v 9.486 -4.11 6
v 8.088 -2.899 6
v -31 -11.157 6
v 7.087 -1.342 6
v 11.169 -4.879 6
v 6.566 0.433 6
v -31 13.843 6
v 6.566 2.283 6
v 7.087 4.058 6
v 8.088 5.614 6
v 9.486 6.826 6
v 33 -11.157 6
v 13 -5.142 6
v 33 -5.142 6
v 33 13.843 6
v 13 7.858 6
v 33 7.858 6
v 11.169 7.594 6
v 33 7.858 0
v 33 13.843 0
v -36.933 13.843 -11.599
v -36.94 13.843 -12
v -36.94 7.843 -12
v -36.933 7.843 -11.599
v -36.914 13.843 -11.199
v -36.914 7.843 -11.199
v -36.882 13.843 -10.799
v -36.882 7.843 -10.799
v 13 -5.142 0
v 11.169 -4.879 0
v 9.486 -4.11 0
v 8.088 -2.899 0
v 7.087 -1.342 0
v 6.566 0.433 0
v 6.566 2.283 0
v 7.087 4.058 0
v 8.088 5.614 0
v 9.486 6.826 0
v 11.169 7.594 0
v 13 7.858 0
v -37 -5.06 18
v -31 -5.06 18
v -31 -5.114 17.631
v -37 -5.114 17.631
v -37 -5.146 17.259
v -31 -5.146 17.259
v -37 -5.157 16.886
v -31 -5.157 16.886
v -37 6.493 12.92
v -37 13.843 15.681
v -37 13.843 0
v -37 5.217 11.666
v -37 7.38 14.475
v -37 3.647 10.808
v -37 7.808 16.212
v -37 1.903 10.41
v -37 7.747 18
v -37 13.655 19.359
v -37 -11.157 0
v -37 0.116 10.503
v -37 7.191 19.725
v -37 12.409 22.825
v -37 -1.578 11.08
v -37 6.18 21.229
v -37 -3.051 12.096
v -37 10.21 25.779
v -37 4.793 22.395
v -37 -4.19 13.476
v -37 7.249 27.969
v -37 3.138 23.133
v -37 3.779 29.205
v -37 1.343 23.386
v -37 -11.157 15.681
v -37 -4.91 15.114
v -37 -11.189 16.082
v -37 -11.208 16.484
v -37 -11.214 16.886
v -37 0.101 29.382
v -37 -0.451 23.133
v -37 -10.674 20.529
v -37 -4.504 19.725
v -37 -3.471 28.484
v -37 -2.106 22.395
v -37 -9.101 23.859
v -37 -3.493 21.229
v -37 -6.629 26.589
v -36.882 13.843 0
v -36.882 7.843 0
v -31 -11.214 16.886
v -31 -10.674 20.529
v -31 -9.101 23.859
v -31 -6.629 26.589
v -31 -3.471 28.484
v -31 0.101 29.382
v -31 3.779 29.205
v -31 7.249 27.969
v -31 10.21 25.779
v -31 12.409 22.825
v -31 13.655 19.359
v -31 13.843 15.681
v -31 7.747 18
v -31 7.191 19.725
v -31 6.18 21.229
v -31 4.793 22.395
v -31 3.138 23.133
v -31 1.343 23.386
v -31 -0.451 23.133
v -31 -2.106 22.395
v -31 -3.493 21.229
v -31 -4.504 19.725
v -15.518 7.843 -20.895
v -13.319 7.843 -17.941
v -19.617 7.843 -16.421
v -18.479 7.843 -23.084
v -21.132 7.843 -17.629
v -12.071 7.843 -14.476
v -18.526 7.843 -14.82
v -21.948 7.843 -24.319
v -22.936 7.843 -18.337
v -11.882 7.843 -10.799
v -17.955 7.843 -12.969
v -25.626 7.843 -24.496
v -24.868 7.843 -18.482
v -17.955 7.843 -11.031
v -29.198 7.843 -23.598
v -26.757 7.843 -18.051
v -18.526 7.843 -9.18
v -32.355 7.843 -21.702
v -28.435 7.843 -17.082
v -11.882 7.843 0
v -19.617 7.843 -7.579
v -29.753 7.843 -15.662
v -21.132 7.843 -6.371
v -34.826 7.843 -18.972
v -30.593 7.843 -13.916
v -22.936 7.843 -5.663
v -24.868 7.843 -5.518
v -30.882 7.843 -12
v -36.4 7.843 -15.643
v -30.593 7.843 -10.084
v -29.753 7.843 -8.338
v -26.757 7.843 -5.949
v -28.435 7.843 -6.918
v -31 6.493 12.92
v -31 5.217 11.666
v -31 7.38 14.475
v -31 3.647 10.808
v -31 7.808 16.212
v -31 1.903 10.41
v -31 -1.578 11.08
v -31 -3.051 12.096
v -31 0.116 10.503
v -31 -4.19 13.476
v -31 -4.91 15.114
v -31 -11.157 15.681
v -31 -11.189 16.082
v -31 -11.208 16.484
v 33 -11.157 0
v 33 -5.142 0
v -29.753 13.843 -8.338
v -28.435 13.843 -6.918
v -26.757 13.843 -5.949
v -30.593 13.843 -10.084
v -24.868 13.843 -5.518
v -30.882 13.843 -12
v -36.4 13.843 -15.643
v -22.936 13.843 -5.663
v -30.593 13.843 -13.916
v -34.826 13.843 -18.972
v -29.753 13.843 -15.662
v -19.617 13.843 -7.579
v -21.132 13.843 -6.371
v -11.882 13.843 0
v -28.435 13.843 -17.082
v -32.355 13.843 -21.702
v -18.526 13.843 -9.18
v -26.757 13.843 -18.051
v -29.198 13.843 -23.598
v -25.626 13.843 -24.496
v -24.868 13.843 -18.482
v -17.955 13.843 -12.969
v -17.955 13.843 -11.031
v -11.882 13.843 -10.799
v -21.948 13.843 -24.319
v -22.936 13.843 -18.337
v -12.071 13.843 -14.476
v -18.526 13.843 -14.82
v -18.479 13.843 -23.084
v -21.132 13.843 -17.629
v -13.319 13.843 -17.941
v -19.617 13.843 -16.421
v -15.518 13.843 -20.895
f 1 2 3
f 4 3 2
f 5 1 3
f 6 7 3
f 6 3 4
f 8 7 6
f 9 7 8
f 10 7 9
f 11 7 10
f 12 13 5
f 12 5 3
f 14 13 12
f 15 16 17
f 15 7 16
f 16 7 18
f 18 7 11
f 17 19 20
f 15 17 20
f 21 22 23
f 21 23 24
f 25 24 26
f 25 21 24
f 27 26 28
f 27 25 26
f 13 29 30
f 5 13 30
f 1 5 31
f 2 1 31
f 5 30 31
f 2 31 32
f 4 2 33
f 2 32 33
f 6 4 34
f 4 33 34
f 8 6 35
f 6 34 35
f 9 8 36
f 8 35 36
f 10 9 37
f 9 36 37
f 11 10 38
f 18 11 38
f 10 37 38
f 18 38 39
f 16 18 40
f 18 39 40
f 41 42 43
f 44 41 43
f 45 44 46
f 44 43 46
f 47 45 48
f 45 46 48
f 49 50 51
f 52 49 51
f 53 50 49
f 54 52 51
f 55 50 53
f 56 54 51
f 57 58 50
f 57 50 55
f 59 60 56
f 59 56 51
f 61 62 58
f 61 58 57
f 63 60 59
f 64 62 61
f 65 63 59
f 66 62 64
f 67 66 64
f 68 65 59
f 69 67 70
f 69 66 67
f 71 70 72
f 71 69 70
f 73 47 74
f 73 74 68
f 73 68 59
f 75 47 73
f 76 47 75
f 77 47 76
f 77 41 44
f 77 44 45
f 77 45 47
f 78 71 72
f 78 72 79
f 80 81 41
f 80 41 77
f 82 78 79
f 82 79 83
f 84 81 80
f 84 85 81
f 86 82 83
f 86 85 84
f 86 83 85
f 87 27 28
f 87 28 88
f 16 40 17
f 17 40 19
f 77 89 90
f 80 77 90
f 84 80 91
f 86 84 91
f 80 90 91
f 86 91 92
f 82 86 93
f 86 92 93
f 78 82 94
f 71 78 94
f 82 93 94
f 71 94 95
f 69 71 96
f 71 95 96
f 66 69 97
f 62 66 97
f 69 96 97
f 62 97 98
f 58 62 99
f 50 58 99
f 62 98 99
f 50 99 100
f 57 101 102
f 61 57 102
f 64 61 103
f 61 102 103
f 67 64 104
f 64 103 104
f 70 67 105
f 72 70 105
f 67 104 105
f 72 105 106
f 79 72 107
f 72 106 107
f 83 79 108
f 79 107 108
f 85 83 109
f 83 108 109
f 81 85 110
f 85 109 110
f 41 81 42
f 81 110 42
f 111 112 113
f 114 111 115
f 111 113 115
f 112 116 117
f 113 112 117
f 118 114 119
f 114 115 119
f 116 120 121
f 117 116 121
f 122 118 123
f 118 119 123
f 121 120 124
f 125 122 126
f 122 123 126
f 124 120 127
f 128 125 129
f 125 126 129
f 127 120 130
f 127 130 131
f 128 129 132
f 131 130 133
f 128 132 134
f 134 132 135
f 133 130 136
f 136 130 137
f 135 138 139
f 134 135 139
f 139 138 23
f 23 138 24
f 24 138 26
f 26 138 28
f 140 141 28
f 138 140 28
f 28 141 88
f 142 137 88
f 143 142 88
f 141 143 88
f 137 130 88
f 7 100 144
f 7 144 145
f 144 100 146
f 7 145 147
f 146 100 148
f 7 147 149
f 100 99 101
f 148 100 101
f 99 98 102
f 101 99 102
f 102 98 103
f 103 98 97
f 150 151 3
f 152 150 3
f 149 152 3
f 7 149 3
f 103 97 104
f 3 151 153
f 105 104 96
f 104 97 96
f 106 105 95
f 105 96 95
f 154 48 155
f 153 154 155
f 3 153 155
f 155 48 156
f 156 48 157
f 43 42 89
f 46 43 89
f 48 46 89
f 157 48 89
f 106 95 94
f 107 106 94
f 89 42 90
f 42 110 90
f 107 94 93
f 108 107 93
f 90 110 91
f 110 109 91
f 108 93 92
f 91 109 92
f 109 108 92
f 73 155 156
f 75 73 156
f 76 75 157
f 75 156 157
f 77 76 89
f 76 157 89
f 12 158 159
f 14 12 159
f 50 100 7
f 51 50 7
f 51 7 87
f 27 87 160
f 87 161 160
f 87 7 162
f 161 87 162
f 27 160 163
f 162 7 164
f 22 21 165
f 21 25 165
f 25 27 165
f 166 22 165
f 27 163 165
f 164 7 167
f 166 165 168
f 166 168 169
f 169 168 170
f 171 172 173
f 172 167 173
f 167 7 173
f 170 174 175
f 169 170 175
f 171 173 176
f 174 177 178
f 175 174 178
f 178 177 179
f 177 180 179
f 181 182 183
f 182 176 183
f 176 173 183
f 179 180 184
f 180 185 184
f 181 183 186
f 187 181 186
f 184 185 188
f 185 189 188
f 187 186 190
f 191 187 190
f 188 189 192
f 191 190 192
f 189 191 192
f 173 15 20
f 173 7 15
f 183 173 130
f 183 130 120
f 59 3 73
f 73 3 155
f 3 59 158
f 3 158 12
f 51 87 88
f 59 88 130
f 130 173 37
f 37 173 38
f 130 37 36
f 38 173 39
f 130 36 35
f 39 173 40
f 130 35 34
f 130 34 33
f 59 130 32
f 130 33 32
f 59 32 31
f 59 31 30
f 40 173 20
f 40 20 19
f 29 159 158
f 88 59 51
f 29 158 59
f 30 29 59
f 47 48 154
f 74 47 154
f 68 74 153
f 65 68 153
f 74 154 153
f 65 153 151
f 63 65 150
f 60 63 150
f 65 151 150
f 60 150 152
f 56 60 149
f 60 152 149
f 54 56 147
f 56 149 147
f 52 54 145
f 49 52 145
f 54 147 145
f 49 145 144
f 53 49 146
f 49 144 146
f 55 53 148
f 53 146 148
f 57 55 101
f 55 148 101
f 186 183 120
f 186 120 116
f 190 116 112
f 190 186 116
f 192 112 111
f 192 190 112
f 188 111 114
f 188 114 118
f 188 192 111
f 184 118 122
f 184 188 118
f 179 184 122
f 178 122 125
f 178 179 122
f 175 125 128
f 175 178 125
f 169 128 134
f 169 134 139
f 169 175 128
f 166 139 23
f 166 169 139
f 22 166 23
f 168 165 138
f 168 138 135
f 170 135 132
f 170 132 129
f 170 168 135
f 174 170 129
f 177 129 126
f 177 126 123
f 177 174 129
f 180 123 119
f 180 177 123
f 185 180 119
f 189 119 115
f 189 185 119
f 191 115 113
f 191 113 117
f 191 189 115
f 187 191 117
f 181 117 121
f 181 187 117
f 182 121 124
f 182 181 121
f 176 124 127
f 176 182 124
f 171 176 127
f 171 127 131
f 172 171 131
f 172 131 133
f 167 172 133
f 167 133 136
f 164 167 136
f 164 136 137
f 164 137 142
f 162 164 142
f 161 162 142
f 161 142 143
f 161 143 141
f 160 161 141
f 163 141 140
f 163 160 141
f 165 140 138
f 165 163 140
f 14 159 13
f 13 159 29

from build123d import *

# Parameters (mm, degrees)
F1_DEPTH = 6
F3_DEPTH = 6
F5_DEPTH = 6


# Not quite as in the source:
# - a feature names something its author has since deleted; it is built from what else it names


with BuildPart() as f1:
    # F0 (on Top) → F1 (new body)
    with BuildSketch(Plane.XY):
        with BuildLine():
            Line((33, 13.8434663415), (-31, 13.8434663415))
            Line((-31, 13.8434663415), (-31, -11.1565336585))
            Line((-31, -11.1565336585), (33, -11.1565336585))
            Line((33, -11.1565336585), (33, -5.1422468387))
            Line((33, -5.1422468387), (13, -5.1422468387))
            ThreePointArc((13, -5.1422468387), (6.5, 1.3577531613), (13, 7.8577531613))
            Line((13, 7.8577531613), (33, 7.8577531613))
            Line((33, 7.8577531613), (33, 13.8434663415))
        make_face()
    extrude(amount=F1_DEPTH)

    # F2 (on face) → F3 (join)
    with BuildSketch(Plane(origin=(-31, 0, 0), x_dir=(0, -1, 0), z_dir=(-1, 0, 0))):
        with BuildLine():
            Line((-13.8434663415, 0), (11.1565336585, 0))
            Line((11.1565336585, 0), (11.1565336585, 15.6810280987))
            ThreePointArc((11.1565336585, 15.6810280987), (-1.3434663415, 4.3280202761), (-13.8434663415, 15.6810280987))
            Line((-13.8434663415, 15.6810280987), (-13.8434663415, 0))
        make_face()
        with BuildLine():
            ThreePointArc((-13.8434663415, 15.6810280987), (-1.3434663415, 4.3280202761), (11.1565336585, 15.6810280987))
            Line((11.1565336585, 15.6810280987), (11.1565336585, 18))
            Line((11.1565336585, 18), (5.0603540757, 18))
            ThreePointArc((5.0603540757, 18), (5.1324441239, 17.4450522775), (5.1565336585, 16.8859604746))
            ThreePointArc((5.1565336585, 16.8859604746), (-1.9025581444, 10.4100500092), (-7.7472867587, 18))
            Line((-7.7472867587, 18), (-13.8434663415, 18))
            Line((-13.8434663415, 18), (-13.8434663415, 15.6810280987))
        make_face()
        with BuildLine():
            Line((11.1565336585, 18), (11.1565336585, 15.6810280987))
            ThreePointArc((11.1565336585, 15.6810280987), (11.1999804438, 16.2827981629), (11.2144738571, 16.8859604746))
            ThreePointArc((11.2144738571, 16.8859604746), (-1.9466286532, 29.4294072599), (-13.8434663415, 15.6810280987))
            Line((-13.8434663415, 15.6810280987), (-13.8434663415, 18))
            Line((-13.8434663415, 18), (-7.7472867587, 18))
            ThreePointArc((-7.7472867587, 18), (-1.3434663415, 23.3859604746), (5.0603540757, 18))
            Line((5.0603540757, 18), (11.1565336585, 18))
        make_face()
    extrude(amount=F3_DEPTH)

    # F4 (on face) → F5 (join)
    with BuildSketch(Plane(origin=(0, 13.8434663415, 0), x_dir=(-1, 0, 0), z_dir=(0, 1, 0))):
        with BuildLine():
            Line((36.8821393698, 6), (11.8821393698, 6))
            Line((11.8821393698, 6), (11.8821393698, -10.7988112149))
            ThreePointArc((11.8821393698, -10.7988112149), (24.3821393698, 0.5575815545), (36.8821393698, -10.7988112149))
            Line((36.8821393698, -10.7988112149), (36.8821393698, 6))
        make_face()
        with BuildLine():
            ThreePointArc((36.8821393698, -10.7988112149), (24.3821393698, 0.5575815545), (11.8821393698, -10.7988112149))
            Line((11.8821393698, -10.7988112149), (11.8821393698, -12))
            Line((11.8821393698, -12), (17.8821393698, -12))
            ThreePointArc((17.8821393698, -12), (24.3821393698, -5.5), (30.8821393698, -12))
            Line((30.8821393698, -12), (36.8821393698, -12))
            Line((36.8821393698, -12), (36.8821393698, -10.7988112149))
        make_face()
        with BuildLine():
            Line((11.8821393698, -12), (11.8821393698, -10.7988112149))
            ThreePointArc((11.8821393698, -10.7988112149), (23.7808552995, -24.5431779053), (36.9397209243, -12))
            ThreePointArc((36.9397209243, -12), (36.9253172752, -11.3987159297), (36.8821393698, -10.7988112149))
            Line((36.8821393698, -10.7988112149), (36.8821393698, -12))
            Line((36.8821393698, -12), (30.8821393698, -12))
            ThreePointArc((30.8821393698, -12), (24.3821393698, -18.5), (17.8821393698, -12))
            Line((17.8821393698, -12), (11.8821393698, -12))
        make_face()
    extrude(amount=-F5_DEPTH)


solid = f1.part
